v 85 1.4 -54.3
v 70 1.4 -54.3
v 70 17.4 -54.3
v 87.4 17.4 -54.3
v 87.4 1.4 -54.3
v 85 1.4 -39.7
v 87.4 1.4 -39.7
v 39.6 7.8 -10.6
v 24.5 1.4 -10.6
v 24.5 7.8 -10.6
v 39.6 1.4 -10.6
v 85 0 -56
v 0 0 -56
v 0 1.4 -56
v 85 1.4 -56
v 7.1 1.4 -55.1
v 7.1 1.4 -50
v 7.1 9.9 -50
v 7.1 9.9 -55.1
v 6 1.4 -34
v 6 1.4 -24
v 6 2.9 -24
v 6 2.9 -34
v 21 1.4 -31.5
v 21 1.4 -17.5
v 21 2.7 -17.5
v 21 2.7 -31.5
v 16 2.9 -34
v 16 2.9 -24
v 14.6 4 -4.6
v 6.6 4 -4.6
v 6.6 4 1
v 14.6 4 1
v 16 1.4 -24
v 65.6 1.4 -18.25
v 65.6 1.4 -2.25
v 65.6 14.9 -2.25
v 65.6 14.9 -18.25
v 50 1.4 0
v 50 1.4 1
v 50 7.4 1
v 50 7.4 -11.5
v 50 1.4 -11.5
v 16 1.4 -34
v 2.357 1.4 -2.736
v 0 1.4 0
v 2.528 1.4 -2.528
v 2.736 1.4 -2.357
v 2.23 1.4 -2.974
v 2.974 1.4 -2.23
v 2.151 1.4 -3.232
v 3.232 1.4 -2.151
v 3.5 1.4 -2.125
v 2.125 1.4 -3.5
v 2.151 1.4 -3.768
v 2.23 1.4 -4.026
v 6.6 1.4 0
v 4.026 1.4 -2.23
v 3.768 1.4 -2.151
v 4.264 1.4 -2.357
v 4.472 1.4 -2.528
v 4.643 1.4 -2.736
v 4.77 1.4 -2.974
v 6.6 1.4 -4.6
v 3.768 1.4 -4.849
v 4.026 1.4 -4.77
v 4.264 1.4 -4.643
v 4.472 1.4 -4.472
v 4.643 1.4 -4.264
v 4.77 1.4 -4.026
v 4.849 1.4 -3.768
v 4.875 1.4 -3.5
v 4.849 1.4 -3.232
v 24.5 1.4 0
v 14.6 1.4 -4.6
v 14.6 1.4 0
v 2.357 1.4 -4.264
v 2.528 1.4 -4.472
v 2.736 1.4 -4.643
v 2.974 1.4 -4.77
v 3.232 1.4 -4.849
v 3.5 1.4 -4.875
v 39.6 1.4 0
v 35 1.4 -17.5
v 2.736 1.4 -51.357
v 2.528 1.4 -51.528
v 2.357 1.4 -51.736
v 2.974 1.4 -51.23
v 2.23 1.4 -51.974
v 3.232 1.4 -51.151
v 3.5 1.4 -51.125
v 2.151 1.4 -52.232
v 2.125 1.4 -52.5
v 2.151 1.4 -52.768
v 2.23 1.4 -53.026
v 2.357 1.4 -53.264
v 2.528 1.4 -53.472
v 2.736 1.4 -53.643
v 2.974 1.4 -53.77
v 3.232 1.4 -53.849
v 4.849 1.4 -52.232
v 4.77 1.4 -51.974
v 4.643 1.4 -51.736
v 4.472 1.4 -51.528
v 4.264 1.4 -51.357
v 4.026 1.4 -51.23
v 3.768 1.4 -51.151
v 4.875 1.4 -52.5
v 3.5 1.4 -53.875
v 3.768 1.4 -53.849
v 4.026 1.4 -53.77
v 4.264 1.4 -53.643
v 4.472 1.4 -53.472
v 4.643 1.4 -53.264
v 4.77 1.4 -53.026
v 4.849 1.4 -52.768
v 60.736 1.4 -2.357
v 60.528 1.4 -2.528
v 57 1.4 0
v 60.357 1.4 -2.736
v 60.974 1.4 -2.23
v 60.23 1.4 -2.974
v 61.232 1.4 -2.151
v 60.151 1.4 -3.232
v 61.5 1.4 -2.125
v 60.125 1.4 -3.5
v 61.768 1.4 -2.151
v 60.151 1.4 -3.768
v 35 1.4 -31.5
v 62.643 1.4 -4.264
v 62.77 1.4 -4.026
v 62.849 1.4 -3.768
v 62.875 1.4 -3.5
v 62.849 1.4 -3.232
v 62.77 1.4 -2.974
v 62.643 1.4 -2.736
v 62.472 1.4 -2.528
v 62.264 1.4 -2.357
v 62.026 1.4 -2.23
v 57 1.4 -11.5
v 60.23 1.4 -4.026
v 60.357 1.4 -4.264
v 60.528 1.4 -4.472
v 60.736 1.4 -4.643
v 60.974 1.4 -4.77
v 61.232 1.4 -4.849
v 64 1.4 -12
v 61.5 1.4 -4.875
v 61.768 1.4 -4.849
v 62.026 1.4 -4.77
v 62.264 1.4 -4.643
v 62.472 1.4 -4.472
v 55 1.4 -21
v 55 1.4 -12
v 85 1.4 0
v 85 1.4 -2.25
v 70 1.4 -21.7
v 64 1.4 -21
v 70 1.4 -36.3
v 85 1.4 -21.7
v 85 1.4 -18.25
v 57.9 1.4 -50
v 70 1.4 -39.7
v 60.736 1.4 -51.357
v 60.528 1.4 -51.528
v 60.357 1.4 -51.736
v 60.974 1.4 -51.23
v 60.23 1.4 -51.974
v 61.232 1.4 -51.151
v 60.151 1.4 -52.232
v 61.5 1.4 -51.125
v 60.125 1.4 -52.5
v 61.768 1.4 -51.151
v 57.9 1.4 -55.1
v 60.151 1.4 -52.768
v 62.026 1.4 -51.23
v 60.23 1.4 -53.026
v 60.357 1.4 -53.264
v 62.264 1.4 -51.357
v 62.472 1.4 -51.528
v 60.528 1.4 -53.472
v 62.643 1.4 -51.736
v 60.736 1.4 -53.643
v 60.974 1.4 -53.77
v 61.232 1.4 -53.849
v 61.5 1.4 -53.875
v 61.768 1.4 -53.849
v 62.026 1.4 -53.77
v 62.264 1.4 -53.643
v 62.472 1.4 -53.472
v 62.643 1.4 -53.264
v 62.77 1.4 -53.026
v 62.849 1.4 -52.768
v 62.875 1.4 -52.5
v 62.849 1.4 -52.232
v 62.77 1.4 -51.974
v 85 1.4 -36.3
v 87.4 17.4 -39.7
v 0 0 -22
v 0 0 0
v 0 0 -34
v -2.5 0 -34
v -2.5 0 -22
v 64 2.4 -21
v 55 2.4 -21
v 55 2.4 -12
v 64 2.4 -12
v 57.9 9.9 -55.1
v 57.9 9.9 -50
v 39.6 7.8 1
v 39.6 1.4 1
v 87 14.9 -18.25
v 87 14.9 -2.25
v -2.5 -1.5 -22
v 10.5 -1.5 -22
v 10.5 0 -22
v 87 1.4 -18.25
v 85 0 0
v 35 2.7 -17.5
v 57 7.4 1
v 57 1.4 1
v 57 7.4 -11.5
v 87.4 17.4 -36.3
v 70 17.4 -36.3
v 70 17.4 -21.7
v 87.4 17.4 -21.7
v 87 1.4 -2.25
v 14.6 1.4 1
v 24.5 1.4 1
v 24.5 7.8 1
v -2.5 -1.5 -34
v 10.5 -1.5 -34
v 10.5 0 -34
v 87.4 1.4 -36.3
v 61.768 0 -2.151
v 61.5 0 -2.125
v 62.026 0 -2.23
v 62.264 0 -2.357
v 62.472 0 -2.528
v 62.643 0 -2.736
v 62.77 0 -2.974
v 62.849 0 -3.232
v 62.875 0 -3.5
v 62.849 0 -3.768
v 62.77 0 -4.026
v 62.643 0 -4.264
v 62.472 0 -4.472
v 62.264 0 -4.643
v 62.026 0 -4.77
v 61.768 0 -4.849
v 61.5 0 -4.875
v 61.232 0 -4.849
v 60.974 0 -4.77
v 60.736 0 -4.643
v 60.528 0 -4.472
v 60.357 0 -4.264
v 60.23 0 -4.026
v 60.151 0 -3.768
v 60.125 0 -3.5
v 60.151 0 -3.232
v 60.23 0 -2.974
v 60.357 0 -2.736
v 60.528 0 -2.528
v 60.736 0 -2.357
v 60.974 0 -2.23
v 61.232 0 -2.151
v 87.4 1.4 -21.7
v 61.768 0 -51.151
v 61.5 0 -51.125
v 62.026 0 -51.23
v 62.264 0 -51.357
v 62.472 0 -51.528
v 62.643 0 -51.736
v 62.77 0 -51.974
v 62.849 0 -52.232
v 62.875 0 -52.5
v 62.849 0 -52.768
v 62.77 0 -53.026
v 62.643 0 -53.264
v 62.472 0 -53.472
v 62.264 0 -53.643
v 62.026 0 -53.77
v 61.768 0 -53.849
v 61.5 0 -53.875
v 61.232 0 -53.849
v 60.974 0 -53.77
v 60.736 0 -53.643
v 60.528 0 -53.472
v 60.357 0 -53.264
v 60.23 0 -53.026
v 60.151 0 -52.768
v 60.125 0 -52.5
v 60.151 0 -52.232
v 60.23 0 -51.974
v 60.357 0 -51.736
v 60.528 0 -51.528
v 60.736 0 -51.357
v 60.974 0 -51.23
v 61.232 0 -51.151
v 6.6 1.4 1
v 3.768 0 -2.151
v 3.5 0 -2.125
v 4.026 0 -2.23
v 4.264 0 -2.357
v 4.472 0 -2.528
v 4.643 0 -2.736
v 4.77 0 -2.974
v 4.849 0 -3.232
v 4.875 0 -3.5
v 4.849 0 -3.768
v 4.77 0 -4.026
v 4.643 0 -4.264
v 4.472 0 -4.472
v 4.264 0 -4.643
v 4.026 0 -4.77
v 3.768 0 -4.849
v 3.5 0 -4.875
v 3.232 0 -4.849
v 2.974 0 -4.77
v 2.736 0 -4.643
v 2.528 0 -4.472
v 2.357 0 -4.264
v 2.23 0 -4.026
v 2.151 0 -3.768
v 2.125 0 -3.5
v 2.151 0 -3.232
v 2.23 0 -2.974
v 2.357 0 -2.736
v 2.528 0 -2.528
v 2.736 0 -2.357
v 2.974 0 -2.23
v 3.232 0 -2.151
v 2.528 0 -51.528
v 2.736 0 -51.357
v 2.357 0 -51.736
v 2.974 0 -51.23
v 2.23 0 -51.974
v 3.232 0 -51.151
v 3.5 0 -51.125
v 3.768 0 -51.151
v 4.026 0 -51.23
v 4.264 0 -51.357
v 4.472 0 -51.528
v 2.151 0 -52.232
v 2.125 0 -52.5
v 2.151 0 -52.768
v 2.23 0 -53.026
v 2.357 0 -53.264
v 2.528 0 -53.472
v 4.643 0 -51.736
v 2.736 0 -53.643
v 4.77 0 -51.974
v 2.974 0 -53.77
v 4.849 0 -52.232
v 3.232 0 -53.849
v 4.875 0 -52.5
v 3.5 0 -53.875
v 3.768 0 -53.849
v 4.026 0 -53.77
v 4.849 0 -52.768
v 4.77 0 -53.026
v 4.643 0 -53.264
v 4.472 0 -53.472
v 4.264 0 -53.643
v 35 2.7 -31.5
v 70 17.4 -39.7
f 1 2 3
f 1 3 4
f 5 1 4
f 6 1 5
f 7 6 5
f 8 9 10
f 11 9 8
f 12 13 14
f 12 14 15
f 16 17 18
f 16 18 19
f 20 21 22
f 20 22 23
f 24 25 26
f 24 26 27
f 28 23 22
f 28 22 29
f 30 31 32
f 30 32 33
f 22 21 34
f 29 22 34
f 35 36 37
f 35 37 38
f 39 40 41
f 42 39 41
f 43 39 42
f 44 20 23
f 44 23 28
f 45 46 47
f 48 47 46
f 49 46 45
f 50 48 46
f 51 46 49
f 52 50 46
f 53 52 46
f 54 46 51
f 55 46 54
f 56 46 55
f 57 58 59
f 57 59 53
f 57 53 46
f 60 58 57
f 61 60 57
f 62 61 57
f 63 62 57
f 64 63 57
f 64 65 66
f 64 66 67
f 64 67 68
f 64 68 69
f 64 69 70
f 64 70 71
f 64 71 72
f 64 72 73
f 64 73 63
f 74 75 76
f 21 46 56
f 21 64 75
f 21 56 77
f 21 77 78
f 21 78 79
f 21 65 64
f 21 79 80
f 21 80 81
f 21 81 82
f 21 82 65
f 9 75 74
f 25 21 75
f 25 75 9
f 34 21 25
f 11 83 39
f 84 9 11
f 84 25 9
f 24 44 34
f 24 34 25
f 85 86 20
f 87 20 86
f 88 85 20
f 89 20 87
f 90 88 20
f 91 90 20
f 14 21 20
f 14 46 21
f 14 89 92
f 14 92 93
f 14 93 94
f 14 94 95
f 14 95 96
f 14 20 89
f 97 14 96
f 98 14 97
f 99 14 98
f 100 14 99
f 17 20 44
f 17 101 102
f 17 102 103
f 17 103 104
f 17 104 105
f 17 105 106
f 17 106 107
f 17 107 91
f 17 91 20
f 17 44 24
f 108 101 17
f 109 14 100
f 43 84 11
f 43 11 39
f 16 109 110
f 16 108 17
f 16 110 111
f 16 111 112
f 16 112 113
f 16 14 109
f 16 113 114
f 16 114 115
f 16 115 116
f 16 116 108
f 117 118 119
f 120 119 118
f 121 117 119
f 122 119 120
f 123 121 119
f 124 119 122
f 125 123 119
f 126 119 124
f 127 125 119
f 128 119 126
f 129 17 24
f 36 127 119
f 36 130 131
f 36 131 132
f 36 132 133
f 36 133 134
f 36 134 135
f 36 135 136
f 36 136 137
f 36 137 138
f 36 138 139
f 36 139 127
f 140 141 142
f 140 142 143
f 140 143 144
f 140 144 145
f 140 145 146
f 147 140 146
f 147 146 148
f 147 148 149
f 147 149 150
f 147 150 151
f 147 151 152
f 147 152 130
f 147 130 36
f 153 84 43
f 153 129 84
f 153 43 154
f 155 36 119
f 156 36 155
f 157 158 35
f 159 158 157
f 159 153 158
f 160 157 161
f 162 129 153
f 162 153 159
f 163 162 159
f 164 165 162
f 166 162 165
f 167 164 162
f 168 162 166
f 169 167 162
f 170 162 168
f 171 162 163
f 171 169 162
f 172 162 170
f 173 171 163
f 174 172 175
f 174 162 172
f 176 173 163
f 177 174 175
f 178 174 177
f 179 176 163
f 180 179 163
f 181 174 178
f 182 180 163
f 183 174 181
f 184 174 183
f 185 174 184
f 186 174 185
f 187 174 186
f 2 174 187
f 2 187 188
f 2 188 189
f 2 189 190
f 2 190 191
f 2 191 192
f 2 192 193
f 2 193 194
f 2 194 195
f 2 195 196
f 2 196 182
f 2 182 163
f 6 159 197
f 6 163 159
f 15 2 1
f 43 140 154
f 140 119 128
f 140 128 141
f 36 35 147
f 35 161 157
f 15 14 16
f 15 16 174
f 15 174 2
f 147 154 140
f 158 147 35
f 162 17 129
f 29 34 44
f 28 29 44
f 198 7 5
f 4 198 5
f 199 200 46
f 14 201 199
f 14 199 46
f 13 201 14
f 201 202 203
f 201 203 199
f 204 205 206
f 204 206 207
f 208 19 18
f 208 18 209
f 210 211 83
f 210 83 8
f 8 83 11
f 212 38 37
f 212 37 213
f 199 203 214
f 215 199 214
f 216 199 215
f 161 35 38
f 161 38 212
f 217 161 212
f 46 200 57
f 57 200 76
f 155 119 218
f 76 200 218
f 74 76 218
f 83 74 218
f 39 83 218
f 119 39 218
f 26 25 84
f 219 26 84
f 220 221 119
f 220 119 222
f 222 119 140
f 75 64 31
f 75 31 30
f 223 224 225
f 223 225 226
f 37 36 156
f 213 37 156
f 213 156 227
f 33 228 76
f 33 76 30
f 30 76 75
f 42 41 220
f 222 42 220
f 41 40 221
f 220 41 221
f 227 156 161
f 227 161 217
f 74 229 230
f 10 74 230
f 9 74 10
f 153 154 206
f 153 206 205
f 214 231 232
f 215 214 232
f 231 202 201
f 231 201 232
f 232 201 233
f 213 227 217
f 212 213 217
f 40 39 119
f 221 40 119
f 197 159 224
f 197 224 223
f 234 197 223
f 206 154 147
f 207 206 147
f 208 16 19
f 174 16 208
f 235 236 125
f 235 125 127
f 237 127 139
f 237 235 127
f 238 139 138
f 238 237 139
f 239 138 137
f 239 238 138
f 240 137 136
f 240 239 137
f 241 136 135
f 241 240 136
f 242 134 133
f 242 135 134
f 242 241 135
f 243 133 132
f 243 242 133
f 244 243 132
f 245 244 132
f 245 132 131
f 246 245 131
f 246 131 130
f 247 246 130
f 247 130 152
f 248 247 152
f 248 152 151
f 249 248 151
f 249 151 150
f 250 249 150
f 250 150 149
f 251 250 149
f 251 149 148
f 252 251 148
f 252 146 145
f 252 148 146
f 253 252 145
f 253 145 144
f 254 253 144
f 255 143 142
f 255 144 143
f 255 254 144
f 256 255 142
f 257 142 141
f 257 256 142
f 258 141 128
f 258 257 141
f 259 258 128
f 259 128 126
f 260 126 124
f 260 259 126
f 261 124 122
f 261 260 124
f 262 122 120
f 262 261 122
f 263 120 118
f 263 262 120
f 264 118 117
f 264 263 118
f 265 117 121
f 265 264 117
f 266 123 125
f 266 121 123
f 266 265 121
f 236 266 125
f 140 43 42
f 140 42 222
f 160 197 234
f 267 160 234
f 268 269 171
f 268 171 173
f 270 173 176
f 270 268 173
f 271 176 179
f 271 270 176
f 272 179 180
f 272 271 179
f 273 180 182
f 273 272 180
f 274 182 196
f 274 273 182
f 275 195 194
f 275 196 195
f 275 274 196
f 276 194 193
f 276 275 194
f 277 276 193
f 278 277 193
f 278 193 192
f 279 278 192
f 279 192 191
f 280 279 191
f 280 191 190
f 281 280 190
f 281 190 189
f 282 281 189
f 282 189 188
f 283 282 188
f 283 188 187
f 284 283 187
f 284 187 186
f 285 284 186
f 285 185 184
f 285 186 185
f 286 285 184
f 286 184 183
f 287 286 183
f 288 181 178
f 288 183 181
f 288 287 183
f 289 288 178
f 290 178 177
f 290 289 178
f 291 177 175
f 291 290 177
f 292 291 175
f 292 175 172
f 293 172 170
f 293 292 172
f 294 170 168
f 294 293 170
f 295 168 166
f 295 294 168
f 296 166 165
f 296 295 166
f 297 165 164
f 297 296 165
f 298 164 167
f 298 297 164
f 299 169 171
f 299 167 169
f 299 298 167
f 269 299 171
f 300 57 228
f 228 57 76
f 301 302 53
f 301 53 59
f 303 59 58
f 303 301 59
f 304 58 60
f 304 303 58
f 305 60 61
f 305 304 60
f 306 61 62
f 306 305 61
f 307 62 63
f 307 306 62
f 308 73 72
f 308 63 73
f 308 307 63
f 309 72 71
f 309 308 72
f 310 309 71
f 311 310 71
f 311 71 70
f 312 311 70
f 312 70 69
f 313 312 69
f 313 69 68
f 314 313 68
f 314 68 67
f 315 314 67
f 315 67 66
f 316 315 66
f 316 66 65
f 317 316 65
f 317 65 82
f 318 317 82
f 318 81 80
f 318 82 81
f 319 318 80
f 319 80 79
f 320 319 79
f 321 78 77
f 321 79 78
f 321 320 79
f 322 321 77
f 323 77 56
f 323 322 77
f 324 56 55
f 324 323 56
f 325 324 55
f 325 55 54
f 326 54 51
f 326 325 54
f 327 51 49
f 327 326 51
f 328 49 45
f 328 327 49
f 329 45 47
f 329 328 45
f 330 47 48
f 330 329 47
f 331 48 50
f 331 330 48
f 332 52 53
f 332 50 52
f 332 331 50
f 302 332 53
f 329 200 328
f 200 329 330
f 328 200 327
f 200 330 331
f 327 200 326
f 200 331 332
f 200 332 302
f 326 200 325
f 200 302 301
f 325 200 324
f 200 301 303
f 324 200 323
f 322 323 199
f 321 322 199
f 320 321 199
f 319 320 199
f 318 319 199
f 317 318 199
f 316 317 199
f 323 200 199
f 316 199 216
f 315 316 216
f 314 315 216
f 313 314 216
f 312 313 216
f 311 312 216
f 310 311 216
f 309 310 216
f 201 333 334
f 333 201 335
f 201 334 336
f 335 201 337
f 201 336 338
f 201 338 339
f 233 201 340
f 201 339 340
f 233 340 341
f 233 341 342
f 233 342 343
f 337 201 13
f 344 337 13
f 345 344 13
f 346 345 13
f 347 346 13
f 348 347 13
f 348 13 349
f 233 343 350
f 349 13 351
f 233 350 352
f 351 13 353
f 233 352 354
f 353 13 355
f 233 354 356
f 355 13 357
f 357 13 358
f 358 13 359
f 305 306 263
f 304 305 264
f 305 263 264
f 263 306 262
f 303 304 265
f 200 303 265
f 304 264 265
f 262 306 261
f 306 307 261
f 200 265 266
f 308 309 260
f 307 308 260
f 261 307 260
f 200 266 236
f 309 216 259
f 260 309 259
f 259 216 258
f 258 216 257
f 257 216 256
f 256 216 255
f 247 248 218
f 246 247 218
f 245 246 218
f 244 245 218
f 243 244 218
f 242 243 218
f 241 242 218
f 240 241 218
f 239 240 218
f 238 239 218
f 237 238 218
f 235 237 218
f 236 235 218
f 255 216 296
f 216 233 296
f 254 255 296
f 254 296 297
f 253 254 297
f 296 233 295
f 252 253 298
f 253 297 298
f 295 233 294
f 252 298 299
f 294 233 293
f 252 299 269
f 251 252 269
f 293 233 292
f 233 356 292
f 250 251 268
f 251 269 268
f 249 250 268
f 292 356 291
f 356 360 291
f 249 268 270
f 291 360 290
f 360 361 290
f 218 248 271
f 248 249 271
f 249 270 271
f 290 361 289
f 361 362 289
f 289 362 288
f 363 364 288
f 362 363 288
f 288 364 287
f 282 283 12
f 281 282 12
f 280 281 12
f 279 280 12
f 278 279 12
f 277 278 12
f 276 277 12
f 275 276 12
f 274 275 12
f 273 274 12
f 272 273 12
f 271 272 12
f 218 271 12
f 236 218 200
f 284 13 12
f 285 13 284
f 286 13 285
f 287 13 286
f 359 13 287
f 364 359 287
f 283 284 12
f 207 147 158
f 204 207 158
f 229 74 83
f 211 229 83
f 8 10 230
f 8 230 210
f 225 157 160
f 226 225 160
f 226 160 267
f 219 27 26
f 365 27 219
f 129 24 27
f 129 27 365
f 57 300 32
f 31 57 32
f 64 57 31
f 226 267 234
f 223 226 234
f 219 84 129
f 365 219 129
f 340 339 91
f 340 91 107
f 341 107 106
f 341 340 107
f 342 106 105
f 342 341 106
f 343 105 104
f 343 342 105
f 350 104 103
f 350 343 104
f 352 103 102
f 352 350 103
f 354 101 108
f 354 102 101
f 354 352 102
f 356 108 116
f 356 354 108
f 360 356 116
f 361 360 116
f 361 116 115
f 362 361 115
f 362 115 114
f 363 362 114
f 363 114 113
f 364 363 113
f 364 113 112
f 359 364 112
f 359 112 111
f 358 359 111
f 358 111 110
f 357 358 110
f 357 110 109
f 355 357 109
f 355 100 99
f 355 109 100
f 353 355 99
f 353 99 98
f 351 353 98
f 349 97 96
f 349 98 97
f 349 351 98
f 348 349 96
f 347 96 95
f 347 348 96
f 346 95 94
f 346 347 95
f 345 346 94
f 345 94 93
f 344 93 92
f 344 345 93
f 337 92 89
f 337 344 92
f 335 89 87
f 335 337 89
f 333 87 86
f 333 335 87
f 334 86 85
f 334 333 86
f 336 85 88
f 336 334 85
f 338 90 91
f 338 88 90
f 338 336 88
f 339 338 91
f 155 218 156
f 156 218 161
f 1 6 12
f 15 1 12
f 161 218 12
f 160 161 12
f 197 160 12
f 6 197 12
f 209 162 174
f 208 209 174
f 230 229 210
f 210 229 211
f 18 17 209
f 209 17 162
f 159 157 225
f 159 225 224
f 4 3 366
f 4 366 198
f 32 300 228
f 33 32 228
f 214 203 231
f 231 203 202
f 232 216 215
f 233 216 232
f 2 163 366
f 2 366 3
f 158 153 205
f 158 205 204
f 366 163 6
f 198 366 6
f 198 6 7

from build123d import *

# Parameters (mm, degrees)
SKETCH1_W               = 85
SKETCH1_H               = 56
PCB_DEPTH               = 1.4
M2_5_HOLE_1_DEPTH       = 102.798624745
M2_5_HOLE_1_DEPTH_BACK  = 102.798624745
SKETCH2_R               = 1.375
M2_5_HOLE_2_DEPTH       = 102.798624745
M2_5_HOLE_2_DEPTH_BACK  = 102.798624745
SKETCH3_R               = 1.375
M2_5_HOLE_3_DEPTH       = 102.798624745
M2_5_HOLE_3_DEPTH_BACK  = 102.798624745
SKETCH4_R               = 1.375
M2_5_HOLE_4_DEPTH       = 102.798624745
M2_5_HOLE_4_DEPTH_BACK  = 102.798624745
SKETCH5_R               = 1.375
GPIO_HEADER_40PIN_START = 1.4
SKETCH6_W               = 50.8
SKETCH6_H               = 5.1
GPIO_HEADER_40PIN_DEPTH = 8.5
USB_PAIR_1_START        = 1.4
SKETCH7_W               = 17.4
SKETCH7_H               = 14.6
USB_PAIR_1_DEPTH        = 16
USB_PAIR_2_START        = 1.4
SKETCH8_W               = 17.4
SKETCH8_H               = 14.6
USB_PAIR_2_DEPTH        = 16
ETHERNET_RJ45_START     = 1.4
SKETCH9_W               = 21.4
SKETCH9_H               = 16
ETHERNET_RJ45_DEPTH     = 13.5
SOC_BCM2837B0_START     = 1.4
SKETCH10_W              = 14
SKETCH10_H              = 14
SOC_BCM2837B0_DEPTH     = 1.3
HDMI_START              = 1.4
SKETCH11_W              = 15.1
SKETCH11_H              = 11.6
HDMI_DEPTH              = 6.4
MICRO_USB_POWER_START   = 1.4
SKETCH12_W              = 8
SKETCH12_H              = 5.6
MICRO_USB_POWER_DEPTH   = 2.6
AUDIO_JACK_START        = 1.4
SKETCH13_W              = 7
SKETCH13_H              = 12.5
AUDIO_JACK_DEPTH        = 6
WIFI_SHIELD_START       = 1.4
SKETCH14_W              = 10
SKETCH14_H              = 10
WIFI_SHIELD_DEPTH       = 1.5
LAN_CHIP_START          = 1.4
SKETCH15_W              = 9
SKETCH15_H              = 9
LAN_CHIP_DEPTH          = 1
SKETCH16_W              = 13
SKETCH16_H              = 12
MICROSD_SLOT_DEPTH      = 1.5


with BuildPart() as part:
    # Sketch1 → PCB (new body)
    with BuildSketch(Plane(origin=(0, 0, 0), x_dir=(1, 0, 0), z_dir=(0, 1, 0))):
        with Locations((42.5, 28)):
            Rectangle(SKETCH1_W, SKETCH1_H)
    extrude(amount=PCB_DEPTH)

    # Sketch2 → M2_5_hole_1 (cut, two sides: drawn at the far end of the back side and taken through both)
    with BuildSketch(Plane(origin=(0, 0, 0), x_dir=(1, 0, 0), z_dir=(0, 1, 0)).offset(-M2_5_HOLE_1_DEPTH_BACK)):
        with Locations(Location((3.5, 3.5, 0), (0, 0, 270))):
            Circle(SKETCH2_R)
    extrude(amount=M2_5_HOLE_1_DEPTH + M2_5_HOLE_1_DEPTH_BACK, mode=Mode.SUBTRACT)

    # Sketch3 → M2_5_hole_2 (cut, two sides: drawn at the far end of the back side and taken through both)
    with BuildSketch(Plane(origin=(0, 0, 0), x_dir=(1, 0, 0), z_dir=(0, 1, 0)).offset(-M2_5_HOLE_2_DEPTH_BACK)):
        with Locations(Location((61.5, 3.5, 0), (0, 0, 270))):
            Circle(SKETCH3_R)
    extrude(amount=M2_5_HOLE_2_DEPTH + M2_5_HOLE_2_DEPTH_BACK, mode=Mode.SUBTRACT)

    # Sketch4 → M2_5_hole_3 (cut, two sides: drawn at the far end of the back side and taken through both)
    with BuildSketch(Plane(origin=(0, 0, 0), x_dir=(1, 0, 0), z_dir=(0, 1, 0)).offset(-M2_5_HOLE_3_DEPTH_BACK)):
        with Locations(Location((3.5, 52.5, 0), (0, 0, 270))):
            Circle(SKETCH4_R)
    extrude(amount=M2_5_HOLE_3_DEPTH + M2_5_HOLE_3_DEPTH_BACK, mode=Mode.SUBTRACT)

    # Sketch5 → M2_5_hole_4 (cut, two sides: drawn at the far end of the back side and taken through both)
    with BuildSketch(Plane(origin=(0, 0, 0), x_dir=(1, 0, 0), z_dir=(0, 1, 0)).offset(-M2_5_HOLE_4_DEPTH_BACK)):
        with Locations(Location((61.5, 52.5, 0), (0, 0, 270))):
            Circle(SKETCH5_R)
    extrude(amount=M2_5_HOLE_4_DEPTH + M2_5_HOLE_4_DEPTH_BACK, mode=Mode.SUBTRACT)

    # Sketch6 → GPIO_header_40pin (add)
    with BuildSketch(Plane(origin=(0, 0, 0), x_dir=(1, 0, 0), z_dir=(0, 1, 0)).offset(GPIO_HEADER_40PIN_START)):
        with Locations((32.5, 52.55)):
            Rectangle(SKETCH6_W, SKETCH6_H)
    extrude(amount=GPIO_HEADER_40PIN_DEPTH)

    # Sketch7 → USB_pair_1 (add)
    with BuildSketch(Plane(origin=(0, 0, 0), x_dir=(1, 0, 0), z_dir=(0, 1, 0)).offset(USB_PAIR_1_START)):
        with Locations((78.7, 29)):
            Rectangle(SKETCH7_W, SKETCH7_H)
    extrude(amount=USB_PAIR_1_DEPTH)

    # Sketch8 → USB_pair_2 (add)
    with BuildSketch(Plane(origin=(0, 0, 0), x_dir=(1, 0, 0), z_dir=(0, 1, 0)).offset(USB_PAIR_2_START)):
        with Locations((78.7, 47)):
            Rectangle(SKETCH8_W, SKETCH8_H)
    extrude(amount=USB_PAIR_2_DEPTH)

    # Sketch9 → Ethernet_RJ45 (add)
    with BuildSketch(Plane(origin=(0, 0, 0), x_dir=(1, 0, 0), z_dir=(0, 1, 0)).offset(ETHERNET_RJ45_START)):
        with Locations((76.3, 10.25)):
            Rectangle(SKETCH9_W, SKETCH9_H)
    extrude(amount=ETHERNET_RJ45_DEPTH)

    # Sketch10 → SoC_BCM2837B0 (add)
    with BuildSketch(Plane(origin=(0, 0, 0), x_dir=(1, 0, 0), z_dir=(0, 1, 0)).offset(SOC_BCM2837B0_START)):
        with Locations((28, 24.5)):
            Rectangle(SKETCH10_W, SKETCH10_H)
    extrude(amount=SOC_BCM2837B0_DEPTH)

    # Sketch11 → HDMI (add)
    with BuildSketch(Plane(origin=(0, 0, 0), x_dir=(1, 0, 0), z_dir=(0, 1, 0)).offset(HDMI_START)):
        with Locations((32.05, 4.8)):
            Rectangle(SKETCH11_W, SKETCH11_H)
    extrude(amount=HDMI_DEPTH)

    # Sketch12 → Micro_USB_power (add)
    with BuildSketch(Plane(origin=(0, 0, 0), x_dir=(1, 0, 0), z_dir=(0, 1, 0)).offset(MICRO_USB_POWER_START)):
        with Locations((10.6, 1.8)):
            Rectangle(SKETCH12_W, SKETCH12_H)
    extrude(amount=MICRO_USB_POWER_DEPTH)

    # Sketch13 → Audio_jack (add)
    with BuildSketch(Plane(origin=(0, 0, 0), x_dir=(1, 0, 0), z_dir=(0, 1, 0)).offset(AUDIO_JACK_START)):
        with Locations((53.5, 5.25)):
            Rectangle(SKETCH13_W, SKETCH13_H)
    extrude(amount=AUDIO_JACK_DEPTH)

    # Sketch14 → WiFi_shield (add)
    with BuildSketch(Plane(origin=(0, 0, 0), x_dir=(1, 0, 0), z_dir=(0, 1, 0)).offset(WIFI_SHIELD_START)):
        with Locations((11, 29)):
            Rectangle(SKETCH14_W, SKETCH14_H)
    extrude(amount=WIFI_SHIELD_DEPTH)

    # Sketch15 → LAN_chip (add)
    with BuildSketch(Plane(origin=(0, 0, 0), x_dir=(1, 0, 0), z_dir=(0, 1, 0)).offset(LAN_CHIP_START)):
        with Locations((59.5, 16.5)):
            Rectangle(SKETCH15_W, SKETCH15_H)
    extrude(amount=LAN_CHIP_DEPTH)

    # Sketch16 → MicroSD_slot (add)
    with BuildSketch(Plane(origin=(0, 0, 0), x_dir=(1, 0, 0), z_dir=(0, 1, 0))):
        with Locations((4, 28)):
            Rectangle(SKETCH16_W, SKETCH16_H)
    extrude(amount=-MICROSD_SLOT_DEPTH)


solid = part.part
